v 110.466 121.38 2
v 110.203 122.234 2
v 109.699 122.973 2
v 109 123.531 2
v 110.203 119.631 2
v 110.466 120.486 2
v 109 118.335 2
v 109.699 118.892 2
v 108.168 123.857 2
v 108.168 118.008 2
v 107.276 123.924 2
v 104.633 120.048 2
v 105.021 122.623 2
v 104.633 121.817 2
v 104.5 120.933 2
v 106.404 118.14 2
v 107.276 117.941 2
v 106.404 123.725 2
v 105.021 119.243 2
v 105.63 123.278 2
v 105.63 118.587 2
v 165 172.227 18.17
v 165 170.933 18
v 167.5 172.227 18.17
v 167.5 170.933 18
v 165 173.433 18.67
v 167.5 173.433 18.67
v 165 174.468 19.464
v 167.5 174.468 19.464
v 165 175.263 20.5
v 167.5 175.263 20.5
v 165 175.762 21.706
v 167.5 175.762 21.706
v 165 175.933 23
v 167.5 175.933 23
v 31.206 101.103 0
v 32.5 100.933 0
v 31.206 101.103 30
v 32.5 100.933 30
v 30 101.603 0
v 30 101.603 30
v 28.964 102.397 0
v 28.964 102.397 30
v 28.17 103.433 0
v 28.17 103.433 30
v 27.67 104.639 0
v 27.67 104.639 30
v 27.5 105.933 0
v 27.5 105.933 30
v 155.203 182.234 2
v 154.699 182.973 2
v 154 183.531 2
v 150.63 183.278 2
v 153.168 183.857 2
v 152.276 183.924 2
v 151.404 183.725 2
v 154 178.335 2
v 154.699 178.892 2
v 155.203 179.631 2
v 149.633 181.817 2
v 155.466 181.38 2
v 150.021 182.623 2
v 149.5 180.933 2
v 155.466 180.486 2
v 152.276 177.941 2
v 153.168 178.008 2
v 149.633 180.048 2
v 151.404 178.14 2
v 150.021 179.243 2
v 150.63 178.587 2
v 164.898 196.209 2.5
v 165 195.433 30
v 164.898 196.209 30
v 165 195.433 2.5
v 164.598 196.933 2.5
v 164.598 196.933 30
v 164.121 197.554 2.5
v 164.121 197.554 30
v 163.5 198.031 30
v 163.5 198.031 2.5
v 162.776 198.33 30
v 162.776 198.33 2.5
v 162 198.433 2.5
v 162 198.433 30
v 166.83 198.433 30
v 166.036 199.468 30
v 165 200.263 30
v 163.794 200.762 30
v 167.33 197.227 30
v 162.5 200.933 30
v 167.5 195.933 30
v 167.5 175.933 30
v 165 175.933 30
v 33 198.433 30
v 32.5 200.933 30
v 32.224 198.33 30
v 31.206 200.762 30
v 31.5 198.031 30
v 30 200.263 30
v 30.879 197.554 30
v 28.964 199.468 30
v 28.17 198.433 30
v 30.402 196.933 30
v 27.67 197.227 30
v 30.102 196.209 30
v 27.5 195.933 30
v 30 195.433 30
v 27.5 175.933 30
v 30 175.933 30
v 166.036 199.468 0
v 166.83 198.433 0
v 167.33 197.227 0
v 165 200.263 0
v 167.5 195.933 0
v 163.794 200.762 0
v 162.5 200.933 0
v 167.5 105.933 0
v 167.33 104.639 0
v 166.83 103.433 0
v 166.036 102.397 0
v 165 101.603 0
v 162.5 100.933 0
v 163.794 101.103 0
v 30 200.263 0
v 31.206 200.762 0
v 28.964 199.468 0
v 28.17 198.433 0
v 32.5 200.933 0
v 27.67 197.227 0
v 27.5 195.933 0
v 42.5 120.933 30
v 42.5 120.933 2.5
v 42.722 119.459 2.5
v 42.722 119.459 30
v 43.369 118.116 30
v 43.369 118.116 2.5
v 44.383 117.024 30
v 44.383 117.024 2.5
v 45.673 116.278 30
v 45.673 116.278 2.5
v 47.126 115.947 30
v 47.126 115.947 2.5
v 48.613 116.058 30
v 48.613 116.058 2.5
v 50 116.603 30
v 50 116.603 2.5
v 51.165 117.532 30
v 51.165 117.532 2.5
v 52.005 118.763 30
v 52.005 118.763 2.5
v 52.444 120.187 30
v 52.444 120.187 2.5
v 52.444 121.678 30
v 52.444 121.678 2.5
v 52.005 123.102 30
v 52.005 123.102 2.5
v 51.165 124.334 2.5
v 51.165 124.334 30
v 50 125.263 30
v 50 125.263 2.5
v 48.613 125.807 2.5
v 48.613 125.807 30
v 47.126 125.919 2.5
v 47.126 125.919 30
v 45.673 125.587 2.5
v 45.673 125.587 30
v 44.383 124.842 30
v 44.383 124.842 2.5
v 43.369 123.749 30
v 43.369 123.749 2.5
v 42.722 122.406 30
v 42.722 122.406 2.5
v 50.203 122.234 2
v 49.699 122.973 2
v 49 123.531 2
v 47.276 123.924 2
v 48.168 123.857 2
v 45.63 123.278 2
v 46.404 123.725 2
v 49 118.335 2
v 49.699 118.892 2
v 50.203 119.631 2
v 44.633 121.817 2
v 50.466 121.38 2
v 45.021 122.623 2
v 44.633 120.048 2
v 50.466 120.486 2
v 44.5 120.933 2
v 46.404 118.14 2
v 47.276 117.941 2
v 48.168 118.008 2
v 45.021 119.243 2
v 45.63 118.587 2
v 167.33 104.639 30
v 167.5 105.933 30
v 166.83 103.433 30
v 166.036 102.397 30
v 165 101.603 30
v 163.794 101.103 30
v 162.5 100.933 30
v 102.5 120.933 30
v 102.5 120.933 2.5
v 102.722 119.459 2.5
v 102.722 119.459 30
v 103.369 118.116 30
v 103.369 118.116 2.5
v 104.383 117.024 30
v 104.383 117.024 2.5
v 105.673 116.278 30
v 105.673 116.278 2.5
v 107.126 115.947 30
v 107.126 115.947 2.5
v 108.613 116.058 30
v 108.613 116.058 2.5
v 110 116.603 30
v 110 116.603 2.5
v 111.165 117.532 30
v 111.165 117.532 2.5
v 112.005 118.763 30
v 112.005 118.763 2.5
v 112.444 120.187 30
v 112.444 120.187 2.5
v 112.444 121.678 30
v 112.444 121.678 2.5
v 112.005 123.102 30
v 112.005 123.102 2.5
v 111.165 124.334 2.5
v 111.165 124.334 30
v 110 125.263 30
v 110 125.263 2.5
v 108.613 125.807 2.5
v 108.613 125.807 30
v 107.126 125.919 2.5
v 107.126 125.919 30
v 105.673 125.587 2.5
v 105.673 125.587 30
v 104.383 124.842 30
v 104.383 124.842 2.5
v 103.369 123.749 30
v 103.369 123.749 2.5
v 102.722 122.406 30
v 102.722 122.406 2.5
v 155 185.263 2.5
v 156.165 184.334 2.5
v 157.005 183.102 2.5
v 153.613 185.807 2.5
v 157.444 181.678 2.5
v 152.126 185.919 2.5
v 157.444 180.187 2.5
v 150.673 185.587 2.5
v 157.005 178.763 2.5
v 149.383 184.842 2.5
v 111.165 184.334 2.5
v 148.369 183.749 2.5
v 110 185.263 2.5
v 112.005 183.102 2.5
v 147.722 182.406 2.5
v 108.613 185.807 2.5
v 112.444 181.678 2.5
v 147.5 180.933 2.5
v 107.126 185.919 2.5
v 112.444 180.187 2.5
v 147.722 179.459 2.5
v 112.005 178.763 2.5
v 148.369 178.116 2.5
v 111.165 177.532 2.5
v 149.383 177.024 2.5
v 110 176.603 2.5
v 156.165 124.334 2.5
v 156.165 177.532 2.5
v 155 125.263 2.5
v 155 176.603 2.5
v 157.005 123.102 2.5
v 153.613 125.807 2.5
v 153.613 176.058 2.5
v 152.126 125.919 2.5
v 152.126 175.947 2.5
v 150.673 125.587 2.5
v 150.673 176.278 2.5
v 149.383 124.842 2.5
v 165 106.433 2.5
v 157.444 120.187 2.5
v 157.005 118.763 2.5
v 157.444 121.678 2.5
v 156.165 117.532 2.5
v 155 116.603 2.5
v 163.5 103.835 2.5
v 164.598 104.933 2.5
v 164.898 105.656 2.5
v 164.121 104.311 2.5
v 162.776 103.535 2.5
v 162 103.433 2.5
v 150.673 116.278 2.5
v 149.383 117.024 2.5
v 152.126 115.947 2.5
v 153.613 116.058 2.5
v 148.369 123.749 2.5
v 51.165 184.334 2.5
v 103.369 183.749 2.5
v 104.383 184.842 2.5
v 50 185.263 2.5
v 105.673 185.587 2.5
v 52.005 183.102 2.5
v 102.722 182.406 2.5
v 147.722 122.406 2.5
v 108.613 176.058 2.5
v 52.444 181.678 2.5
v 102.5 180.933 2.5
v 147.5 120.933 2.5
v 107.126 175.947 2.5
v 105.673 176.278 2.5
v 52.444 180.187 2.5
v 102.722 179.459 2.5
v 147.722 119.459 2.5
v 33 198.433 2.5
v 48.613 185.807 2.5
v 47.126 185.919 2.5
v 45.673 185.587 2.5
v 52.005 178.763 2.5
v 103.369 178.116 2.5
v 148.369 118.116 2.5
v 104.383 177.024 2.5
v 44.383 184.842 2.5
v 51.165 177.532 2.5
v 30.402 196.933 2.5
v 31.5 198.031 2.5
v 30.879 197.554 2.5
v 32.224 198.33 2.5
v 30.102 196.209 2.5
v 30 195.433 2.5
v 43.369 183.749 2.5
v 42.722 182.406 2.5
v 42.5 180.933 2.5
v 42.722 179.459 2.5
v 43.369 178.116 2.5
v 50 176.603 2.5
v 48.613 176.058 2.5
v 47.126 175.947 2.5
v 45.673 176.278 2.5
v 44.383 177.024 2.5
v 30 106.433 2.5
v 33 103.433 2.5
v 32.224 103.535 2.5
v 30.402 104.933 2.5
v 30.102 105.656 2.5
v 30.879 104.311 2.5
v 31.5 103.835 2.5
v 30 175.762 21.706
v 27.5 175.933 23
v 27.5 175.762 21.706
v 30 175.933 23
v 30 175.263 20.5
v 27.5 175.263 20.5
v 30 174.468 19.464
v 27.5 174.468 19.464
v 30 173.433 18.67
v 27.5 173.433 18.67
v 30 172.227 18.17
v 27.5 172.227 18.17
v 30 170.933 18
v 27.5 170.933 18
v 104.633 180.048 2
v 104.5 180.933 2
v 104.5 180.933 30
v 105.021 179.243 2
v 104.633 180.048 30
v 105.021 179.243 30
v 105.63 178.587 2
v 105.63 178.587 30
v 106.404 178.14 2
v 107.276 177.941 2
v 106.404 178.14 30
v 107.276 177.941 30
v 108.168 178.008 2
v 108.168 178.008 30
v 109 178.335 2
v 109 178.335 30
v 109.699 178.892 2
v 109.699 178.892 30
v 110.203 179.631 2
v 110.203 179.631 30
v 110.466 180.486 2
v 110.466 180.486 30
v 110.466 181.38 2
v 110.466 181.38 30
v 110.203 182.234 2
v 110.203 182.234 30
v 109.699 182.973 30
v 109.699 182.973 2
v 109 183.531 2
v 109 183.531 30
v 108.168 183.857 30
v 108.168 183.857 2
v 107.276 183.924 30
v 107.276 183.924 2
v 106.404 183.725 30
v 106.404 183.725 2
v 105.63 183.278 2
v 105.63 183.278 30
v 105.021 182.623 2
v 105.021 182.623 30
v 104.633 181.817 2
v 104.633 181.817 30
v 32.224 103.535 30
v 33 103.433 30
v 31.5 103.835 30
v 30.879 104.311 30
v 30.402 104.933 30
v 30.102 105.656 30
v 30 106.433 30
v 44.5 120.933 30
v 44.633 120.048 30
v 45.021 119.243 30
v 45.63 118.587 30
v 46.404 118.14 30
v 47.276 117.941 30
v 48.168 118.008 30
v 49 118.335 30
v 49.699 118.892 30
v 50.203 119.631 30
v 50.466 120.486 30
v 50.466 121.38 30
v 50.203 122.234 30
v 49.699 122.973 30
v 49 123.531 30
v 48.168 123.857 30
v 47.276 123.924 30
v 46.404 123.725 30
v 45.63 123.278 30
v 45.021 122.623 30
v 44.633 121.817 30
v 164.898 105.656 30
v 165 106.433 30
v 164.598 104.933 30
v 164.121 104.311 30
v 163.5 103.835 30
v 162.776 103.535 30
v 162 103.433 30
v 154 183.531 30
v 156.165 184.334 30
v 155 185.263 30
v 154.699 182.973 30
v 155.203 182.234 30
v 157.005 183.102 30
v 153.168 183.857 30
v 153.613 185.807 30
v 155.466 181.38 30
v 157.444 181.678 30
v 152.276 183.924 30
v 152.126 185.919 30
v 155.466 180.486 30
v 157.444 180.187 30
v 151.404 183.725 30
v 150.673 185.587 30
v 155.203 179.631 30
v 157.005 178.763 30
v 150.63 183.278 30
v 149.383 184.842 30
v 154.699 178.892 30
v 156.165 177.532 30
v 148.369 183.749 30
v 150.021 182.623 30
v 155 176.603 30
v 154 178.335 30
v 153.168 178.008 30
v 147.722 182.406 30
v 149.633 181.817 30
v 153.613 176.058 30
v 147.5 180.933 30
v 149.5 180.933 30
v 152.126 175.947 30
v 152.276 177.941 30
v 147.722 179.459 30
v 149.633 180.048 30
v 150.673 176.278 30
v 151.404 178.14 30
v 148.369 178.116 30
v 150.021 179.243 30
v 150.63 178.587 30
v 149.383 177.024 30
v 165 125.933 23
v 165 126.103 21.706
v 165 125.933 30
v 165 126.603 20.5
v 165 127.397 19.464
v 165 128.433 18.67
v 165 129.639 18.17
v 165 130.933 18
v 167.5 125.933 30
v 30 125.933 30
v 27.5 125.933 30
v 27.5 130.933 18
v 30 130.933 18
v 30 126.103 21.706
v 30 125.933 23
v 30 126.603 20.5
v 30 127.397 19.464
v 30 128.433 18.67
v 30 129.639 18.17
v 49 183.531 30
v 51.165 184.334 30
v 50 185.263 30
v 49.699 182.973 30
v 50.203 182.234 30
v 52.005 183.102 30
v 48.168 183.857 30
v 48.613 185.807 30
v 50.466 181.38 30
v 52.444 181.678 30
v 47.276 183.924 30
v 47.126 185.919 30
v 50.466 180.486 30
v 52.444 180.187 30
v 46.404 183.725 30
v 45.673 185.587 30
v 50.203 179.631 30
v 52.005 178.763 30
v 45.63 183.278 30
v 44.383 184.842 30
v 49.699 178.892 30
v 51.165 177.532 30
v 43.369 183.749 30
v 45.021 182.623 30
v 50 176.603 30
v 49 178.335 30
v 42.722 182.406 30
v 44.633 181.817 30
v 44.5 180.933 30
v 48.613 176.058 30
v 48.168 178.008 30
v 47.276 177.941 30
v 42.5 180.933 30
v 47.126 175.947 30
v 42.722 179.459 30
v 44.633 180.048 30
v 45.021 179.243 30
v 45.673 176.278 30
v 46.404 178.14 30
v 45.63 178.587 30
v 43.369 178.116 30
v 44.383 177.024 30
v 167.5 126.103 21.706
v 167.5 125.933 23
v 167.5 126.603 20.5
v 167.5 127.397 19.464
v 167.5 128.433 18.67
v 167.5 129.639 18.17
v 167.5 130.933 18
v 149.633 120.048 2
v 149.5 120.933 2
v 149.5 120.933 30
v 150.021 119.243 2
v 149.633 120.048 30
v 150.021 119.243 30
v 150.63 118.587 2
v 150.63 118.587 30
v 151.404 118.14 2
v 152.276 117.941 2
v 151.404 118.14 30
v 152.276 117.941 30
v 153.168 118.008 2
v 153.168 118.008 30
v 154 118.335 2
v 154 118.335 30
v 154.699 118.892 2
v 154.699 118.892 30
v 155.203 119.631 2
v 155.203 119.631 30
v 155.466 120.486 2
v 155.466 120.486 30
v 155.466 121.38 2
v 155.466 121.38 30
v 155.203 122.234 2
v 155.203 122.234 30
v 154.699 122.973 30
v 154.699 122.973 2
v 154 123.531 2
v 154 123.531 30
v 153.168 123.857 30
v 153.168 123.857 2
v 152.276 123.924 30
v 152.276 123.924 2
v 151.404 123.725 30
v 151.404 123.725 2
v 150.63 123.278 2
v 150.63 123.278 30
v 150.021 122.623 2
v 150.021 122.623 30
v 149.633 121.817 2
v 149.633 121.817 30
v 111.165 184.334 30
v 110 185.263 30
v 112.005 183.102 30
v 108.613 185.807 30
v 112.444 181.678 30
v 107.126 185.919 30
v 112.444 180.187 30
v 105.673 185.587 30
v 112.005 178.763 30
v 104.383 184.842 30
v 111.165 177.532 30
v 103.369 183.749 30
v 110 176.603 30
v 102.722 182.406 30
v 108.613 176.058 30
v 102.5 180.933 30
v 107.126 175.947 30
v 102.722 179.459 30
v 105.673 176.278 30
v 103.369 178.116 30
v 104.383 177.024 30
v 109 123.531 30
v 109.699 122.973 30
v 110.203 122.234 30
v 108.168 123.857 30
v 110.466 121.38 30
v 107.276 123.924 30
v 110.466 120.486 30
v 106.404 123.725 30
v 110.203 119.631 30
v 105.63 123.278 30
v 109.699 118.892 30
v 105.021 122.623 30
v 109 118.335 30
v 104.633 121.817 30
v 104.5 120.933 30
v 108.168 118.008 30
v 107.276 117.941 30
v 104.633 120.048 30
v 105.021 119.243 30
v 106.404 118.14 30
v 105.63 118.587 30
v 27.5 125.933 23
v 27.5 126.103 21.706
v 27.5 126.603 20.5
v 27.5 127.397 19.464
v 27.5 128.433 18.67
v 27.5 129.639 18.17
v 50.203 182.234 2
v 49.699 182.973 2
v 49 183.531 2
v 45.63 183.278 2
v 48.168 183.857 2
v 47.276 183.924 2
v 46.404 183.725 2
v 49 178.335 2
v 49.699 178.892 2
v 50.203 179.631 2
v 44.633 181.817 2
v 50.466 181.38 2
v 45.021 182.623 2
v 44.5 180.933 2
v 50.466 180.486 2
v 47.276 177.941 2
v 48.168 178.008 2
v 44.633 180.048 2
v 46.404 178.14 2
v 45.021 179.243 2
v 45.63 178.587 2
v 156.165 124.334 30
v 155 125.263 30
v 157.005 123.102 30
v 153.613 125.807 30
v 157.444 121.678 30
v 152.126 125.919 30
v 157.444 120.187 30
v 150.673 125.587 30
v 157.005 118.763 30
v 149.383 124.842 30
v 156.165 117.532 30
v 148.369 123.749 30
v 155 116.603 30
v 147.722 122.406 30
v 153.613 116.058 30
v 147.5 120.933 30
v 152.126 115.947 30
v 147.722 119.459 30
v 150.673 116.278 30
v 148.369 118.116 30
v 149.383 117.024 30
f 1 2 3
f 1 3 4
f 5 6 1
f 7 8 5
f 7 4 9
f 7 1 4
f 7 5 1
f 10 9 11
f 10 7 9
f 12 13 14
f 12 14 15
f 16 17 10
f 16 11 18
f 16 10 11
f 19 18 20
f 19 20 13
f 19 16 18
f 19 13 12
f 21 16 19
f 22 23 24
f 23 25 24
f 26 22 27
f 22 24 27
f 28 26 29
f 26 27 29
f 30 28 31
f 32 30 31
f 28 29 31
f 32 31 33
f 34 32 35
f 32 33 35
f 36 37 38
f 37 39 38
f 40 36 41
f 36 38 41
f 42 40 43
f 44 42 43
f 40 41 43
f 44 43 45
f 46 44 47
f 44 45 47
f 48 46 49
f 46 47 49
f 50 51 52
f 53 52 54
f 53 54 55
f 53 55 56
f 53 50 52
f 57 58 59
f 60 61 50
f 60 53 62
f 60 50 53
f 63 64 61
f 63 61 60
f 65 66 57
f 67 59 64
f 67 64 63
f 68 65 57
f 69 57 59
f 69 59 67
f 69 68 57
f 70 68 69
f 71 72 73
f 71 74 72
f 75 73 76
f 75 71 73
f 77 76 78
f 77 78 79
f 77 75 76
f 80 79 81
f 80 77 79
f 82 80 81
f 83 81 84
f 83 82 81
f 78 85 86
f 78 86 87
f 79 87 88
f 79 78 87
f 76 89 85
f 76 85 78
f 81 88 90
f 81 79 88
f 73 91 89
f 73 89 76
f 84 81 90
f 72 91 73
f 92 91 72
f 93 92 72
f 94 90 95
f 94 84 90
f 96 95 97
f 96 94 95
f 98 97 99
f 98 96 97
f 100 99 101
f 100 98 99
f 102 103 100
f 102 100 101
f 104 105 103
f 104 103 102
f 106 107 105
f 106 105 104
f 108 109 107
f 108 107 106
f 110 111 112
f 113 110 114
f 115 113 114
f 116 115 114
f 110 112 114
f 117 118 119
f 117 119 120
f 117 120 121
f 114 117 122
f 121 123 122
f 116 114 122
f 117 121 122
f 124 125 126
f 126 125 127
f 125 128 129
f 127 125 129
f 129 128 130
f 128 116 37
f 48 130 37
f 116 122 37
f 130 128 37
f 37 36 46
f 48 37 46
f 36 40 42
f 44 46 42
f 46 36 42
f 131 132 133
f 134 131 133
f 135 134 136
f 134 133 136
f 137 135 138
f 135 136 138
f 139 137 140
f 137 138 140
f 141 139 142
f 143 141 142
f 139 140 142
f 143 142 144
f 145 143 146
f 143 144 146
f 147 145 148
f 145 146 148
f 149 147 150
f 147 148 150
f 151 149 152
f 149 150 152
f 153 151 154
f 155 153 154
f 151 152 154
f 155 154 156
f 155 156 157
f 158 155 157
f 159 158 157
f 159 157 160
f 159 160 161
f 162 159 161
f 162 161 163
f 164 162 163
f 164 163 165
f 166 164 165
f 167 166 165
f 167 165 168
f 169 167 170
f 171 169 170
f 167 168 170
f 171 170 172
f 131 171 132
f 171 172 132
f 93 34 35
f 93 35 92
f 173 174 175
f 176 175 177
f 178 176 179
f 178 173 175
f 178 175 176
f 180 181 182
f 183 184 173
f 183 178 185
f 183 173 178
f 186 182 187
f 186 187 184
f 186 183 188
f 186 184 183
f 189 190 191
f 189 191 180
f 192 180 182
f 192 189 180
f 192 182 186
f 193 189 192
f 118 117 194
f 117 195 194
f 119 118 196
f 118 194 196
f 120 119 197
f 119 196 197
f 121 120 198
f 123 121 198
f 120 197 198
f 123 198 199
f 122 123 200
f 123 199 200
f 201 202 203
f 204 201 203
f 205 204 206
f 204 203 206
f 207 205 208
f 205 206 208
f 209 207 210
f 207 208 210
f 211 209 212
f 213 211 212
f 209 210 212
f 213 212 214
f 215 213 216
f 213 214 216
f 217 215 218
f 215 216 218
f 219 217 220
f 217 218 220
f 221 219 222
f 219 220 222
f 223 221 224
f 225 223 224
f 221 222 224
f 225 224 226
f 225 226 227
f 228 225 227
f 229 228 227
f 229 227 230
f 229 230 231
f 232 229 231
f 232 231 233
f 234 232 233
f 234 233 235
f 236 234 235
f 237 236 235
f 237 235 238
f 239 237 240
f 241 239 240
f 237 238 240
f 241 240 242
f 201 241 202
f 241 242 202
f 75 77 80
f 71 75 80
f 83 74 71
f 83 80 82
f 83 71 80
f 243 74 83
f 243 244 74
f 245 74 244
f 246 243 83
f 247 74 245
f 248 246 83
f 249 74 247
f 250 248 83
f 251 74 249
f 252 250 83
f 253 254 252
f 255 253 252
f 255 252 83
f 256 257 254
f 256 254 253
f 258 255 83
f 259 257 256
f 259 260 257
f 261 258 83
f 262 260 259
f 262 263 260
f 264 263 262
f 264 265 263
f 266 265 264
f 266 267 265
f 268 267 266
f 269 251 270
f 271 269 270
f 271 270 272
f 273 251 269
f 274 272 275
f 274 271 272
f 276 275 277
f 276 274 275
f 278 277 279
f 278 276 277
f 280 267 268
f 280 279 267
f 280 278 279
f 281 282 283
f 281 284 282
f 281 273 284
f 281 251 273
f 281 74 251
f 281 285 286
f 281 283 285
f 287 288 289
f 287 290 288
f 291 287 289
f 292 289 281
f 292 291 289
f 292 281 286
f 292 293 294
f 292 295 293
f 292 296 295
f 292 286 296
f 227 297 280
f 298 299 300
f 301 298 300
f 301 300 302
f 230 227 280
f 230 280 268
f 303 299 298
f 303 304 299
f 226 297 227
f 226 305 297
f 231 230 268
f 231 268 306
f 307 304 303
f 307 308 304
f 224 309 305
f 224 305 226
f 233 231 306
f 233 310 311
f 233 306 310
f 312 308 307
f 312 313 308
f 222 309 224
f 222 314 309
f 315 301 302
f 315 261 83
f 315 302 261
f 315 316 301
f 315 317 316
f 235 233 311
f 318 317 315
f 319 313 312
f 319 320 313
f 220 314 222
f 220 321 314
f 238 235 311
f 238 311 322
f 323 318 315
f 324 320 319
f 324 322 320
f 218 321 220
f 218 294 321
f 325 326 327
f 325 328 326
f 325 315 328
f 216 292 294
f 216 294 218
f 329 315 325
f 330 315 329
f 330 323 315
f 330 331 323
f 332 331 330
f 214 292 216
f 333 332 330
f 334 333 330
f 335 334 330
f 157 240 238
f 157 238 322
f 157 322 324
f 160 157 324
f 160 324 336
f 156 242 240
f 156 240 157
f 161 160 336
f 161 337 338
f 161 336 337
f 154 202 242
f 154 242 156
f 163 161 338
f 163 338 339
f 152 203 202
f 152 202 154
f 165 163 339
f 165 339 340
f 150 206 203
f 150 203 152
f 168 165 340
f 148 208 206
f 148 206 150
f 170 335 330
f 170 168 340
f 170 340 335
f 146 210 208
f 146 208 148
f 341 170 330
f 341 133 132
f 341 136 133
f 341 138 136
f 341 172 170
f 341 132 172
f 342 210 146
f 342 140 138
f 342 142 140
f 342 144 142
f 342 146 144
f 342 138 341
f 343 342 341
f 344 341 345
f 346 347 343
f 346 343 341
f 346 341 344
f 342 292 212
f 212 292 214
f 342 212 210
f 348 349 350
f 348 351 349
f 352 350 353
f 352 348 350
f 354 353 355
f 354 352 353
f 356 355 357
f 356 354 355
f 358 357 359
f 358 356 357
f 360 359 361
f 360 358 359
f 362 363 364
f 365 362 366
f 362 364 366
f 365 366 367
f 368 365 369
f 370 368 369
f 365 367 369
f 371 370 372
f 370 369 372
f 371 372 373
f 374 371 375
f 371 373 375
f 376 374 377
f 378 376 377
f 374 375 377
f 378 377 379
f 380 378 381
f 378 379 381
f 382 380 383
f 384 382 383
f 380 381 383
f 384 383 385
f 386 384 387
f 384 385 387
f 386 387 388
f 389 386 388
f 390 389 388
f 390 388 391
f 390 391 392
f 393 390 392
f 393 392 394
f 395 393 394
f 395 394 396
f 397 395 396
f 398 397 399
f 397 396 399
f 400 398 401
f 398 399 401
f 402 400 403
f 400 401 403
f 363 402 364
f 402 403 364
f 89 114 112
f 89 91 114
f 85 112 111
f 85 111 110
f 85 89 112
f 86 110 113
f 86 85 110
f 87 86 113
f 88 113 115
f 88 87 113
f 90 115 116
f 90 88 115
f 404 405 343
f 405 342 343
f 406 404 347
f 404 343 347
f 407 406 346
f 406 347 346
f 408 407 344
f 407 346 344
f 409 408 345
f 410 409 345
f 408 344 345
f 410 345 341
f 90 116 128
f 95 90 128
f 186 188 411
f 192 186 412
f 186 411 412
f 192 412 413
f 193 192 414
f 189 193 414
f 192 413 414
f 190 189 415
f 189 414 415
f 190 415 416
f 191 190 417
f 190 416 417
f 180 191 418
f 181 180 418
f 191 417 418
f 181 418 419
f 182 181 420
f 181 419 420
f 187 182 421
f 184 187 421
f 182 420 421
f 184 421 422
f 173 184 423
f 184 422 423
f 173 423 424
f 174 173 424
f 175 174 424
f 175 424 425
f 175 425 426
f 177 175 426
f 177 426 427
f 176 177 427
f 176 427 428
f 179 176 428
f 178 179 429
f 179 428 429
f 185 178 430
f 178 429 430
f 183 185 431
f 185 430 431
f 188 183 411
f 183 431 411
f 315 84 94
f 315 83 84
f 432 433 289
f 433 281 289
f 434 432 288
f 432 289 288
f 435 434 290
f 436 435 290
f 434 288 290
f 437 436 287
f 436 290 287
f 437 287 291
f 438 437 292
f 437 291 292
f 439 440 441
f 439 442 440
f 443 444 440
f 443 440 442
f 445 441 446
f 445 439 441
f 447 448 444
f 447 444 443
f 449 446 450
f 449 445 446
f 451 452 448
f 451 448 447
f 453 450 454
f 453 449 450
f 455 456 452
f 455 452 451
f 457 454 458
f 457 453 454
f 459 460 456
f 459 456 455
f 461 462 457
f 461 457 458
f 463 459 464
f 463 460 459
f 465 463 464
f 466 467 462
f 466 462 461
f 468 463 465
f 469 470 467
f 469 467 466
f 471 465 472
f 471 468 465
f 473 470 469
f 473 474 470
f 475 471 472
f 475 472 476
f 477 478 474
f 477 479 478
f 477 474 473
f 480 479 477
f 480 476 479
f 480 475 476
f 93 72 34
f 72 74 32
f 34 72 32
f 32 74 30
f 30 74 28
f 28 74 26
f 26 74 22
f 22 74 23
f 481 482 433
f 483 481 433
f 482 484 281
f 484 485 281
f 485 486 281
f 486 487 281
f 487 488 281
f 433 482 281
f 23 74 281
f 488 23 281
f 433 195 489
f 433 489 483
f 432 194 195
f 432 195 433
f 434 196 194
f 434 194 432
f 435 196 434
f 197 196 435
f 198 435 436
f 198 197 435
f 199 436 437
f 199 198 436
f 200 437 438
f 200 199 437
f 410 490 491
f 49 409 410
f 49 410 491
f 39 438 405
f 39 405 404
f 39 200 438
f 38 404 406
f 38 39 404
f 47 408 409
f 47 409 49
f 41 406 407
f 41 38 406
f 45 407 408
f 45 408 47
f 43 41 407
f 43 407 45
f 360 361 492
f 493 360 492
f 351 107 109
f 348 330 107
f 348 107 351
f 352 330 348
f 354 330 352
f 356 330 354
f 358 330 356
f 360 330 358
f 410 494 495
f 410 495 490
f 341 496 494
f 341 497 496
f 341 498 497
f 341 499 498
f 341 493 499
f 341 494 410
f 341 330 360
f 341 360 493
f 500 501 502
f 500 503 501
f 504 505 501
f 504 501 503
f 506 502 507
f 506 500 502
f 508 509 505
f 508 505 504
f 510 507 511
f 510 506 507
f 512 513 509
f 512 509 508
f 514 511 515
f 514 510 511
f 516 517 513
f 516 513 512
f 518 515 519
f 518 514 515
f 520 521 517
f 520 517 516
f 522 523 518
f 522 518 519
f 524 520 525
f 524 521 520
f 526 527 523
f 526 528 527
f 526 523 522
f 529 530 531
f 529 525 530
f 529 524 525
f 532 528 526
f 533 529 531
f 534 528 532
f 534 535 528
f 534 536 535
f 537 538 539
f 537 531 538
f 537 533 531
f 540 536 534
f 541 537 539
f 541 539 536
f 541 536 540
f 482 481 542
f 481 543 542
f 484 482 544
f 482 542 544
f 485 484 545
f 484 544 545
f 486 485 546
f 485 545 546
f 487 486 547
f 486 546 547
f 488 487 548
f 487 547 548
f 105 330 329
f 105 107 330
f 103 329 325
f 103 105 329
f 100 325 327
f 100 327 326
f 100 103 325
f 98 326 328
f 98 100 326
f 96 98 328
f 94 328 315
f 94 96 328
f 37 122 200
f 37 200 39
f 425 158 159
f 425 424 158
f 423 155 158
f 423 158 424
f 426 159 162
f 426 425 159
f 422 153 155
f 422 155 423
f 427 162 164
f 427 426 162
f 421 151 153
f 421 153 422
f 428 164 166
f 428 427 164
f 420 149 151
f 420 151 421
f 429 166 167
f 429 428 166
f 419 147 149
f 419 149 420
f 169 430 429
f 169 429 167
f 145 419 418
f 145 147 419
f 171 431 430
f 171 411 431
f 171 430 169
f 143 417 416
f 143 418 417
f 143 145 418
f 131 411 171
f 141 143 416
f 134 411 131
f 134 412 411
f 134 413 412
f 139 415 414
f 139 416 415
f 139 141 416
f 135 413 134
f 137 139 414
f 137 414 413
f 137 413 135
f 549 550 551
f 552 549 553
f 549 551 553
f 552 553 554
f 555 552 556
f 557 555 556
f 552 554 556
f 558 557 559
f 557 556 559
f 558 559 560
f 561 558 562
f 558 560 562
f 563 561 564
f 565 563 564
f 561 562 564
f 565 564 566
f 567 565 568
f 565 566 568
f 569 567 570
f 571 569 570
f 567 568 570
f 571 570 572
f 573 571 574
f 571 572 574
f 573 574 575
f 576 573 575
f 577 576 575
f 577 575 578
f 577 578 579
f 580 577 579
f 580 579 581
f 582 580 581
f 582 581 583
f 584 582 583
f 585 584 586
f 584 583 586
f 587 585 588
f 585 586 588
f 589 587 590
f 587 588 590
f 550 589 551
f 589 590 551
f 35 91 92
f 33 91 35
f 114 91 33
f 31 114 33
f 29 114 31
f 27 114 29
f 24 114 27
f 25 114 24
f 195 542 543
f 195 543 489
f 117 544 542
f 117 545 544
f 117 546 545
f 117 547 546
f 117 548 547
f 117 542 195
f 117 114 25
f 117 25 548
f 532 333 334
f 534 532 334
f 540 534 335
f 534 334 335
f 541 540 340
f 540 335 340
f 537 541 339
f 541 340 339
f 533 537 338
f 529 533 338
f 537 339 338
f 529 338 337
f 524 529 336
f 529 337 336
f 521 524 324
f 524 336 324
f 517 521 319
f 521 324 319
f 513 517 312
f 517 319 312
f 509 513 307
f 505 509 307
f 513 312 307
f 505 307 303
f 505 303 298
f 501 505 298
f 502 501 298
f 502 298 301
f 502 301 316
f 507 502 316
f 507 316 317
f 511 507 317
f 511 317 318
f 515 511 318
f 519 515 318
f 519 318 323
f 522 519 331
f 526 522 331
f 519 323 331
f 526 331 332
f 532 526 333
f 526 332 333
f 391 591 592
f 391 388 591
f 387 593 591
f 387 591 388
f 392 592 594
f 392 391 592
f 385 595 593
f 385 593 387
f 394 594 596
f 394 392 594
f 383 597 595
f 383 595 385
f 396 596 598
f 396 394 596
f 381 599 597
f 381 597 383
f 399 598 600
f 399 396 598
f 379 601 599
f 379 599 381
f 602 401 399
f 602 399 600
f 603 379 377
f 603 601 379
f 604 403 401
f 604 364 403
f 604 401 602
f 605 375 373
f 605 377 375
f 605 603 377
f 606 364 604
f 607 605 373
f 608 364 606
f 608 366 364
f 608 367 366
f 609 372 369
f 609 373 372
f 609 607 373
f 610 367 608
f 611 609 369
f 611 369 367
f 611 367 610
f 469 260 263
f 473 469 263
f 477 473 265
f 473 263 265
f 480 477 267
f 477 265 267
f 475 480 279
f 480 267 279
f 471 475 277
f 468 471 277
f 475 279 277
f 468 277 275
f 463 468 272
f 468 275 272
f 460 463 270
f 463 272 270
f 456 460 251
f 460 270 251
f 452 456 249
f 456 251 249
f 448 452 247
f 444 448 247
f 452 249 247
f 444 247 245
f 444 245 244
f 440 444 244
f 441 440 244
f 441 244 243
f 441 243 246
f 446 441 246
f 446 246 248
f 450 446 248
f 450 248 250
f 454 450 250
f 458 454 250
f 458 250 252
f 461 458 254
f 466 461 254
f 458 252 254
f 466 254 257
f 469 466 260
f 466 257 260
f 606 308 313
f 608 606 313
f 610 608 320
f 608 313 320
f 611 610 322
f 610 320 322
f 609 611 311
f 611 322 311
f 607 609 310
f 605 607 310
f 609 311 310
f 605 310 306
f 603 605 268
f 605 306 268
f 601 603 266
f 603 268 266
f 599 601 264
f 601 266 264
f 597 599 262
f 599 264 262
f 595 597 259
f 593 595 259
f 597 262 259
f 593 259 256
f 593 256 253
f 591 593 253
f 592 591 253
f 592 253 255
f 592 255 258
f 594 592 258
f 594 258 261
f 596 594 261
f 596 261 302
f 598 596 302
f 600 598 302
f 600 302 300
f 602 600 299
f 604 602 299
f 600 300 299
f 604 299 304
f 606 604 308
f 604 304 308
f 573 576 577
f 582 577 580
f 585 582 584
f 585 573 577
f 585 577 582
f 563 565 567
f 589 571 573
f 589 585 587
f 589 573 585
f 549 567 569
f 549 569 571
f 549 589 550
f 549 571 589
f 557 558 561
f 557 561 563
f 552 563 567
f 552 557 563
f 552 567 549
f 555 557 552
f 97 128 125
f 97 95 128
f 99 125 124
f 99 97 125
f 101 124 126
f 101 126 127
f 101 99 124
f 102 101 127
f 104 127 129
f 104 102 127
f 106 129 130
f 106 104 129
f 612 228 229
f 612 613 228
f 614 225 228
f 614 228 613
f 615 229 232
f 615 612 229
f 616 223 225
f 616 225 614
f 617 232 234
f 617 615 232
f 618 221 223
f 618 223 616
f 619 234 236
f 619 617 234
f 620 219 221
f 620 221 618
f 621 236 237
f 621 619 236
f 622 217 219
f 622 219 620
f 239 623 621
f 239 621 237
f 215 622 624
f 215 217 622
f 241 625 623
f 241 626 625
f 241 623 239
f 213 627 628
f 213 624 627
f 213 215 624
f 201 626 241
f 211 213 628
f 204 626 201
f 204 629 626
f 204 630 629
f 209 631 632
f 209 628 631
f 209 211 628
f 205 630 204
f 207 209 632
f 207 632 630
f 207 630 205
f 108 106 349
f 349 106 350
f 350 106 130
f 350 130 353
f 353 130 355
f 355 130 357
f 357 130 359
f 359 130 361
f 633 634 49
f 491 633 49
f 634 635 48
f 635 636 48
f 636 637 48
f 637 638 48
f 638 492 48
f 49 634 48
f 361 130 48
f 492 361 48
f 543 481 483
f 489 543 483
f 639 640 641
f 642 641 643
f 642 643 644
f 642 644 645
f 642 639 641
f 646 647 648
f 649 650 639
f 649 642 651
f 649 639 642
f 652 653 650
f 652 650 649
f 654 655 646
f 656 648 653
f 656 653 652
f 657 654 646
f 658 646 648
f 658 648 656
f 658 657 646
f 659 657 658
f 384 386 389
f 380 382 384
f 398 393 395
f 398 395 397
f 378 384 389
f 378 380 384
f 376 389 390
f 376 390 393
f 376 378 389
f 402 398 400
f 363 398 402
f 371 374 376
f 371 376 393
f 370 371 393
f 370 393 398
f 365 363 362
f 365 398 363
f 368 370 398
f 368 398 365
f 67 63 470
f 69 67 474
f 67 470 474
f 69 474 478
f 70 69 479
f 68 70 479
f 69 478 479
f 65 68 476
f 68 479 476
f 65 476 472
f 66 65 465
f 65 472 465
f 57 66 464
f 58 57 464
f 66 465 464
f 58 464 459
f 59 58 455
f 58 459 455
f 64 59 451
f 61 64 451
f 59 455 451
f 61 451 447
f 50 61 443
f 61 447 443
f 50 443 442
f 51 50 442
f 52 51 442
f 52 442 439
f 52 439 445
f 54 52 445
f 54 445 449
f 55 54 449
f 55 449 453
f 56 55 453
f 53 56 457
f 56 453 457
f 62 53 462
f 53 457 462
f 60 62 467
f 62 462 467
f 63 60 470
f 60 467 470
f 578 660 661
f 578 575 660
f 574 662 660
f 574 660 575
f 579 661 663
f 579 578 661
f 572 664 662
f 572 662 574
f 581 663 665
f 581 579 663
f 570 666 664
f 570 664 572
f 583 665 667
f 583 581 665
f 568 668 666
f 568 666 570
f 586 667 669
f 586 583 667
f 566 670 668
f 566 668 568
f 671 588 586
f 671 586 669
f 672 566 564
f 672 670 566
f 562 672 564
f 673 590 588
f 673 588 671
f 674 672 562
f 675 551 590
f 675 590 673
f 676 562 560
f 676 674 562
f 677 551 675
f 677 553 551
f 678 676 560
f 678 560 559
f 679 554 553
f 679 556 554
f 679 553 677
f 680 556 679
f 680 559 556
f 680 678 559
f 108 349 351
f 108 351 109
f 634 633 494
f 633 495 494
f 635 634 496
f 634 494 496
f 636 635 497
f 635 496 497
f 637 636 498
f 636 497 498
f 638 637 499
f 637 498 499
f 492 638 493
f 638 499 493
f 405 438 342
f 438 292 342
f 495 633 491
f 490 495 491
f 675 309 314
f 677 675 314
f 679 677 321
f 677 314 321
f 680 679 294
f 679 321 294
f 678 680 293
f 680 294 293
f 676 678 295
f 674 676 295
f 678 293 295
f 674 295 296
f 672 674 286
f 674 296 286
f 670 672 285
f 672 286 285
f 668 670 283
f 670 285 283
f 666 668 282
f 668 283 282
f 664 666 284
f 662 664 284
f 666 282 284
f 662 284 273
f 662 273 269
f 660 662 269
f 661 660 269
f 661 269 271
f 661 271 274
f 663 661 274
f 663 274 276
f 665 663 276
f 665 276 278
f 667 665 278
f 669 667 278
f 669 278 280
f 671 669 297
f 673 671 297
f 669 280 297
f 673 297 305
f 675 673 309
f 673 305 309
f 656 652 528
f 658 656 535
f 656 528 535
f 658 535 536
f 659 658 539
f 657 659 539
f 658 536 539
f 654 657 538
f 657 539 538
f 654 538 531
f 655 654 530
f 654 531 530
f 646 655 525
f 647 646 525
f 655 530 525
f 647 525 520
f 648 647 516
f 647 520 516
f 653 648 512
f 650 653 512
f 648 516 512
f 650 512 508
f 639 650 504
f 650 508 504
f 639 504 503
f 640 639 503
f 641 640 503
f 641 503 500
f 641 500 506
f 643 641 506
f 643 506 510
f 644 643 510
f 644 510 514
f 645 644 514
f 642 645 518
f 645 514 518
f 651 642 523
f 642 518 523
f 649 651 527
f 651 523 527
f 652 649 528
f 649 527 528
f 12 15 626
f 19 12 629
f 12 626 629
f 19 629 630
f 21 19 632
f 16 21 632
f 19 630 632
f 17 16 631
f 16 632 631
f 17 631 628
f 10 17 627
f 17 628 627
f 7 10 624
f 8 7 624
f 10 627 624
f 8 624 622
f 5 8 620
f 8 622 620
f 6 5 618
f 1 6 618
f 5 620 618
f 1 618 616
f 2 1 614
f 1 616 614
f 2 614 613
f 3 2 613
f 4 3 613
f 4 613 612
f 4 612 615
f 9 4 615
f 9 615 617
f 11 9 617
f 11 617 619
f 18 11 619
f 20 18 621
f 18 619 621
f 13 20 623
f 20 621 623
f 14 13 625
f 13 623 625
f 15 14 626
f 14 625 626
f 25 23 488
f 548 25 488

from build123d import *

# Parameters (mm, degrees)
F0_W          = 140
F0_H          = 100
F1_DEPTH      = 30
F2_T          = -2.5
F3_W          = 50
F3_H          = 12
F4_DEPTH      = 205.5
F5_R          = 5
F6_R          = 5
F7_R          = 3
F8_R          = 5
F9_DEPTH      = 27.5
F10_T         = 2
F10_T3_DEPTH  = 93
F10_T5_DEPTH  = 133
F10_T8_ANGLE  = 90.000000001
F10_T10_ANGLE = 90.000000001
F10_T12_ANGLE = 90.000000001
F10_T14_ANGLE = 90.000000001
F11_ANGLE     = 60
F12_ANGLE     = 30
F13_ANGLE     = 90


# Not quite as in the source:
# - a shell that OpenCascade refuses in one call is made with other operations: the cavity is built on its own and cut out


with BuildPart() as f1:
    # F0 (on Top) → F1 (new body)
    with BuildSketch(Plane.XY):
        with Locations((50, 0)):
            Rectangle(F0_W, F0_H)
    extrude(amount=F1_DEPTH)

    # F2
    f2_openings = [f1.faces().sort_by_distance(p)[0] for p in [
        (50, 0, 30),
    ]]
    offset(amount=F2_T, openings=f2_openings)

    # F3 (on face) → F4 (cut)
    with BuildSketch(Plane.YZ.offset(120)):
        with Locations((0, 24)):
            Rectangle(F3_W, F3_H)
    extrude(amount=-F4_DEPTH, mode=Mode.SUBTRACT)

    # F5
    f5_edges = [f1.edges().sort_by_distance(p)[0] for p in [
        (-18.75, 25, 18),
        (-18.75, -25, 18),
        (118.75, -25, 18),
        (118.75, 25, 18),
    ]]
    fillet(f5_edges, radius=F5_R)

    # F6
    f6_edges = [f1.edges().sort_by_distance(p)[0] for p in [
        (120, 50, 15),
        (-20, 50, 15),
        (-20, -50, 15),
        (120, -50, 15),
    ]]
    fillet(f6_edges, radius=F6_R)

    # F7
    f7_edges = [f1.edges().sort_by_distance(p)[0] for p in [
        (-17.5, -47.5, 16.25),
        (-17.5, 47.5, 16.25),
        (117.5, 47.5, 16.25),
        (117.5, -47.5, 16.25),
    ]]
    fillet(f7_edges, radius=F7_R)

    # F8 (on face) → F9 (join, through all)
    with BuildSketch(Plane.XY.offset(2.5)):
        with Locations((-5, -30)):
            Circle(F8_R)
        with Locations((40, -30)):
            Circle(F8_R)
        with Locations((100, -30)):
            Circle(F8_R)
        with Locations((100, 30)):
            Circle(F8_R)
        with Locations((40, 30)):
            Circle(F8_R)
        with Locations((-5, 30)):
            Circle(F8_R)
    extrude(amount=F9_DEPTH)

    # F10: shell of thickness 2, made by hand


with BuildPart() as f10_core1:
    # F10_t2: copy of F1
    add(f1.part)

    # the walls: a layer under each face that stays
    f10_faces = [f10_core1.faces().sort_by_distance(p)[0] for p in [
        (-10, -48.2142857143, 30),
        (117.5, 0, 16.25),
        (116.6213203436, -46.6213203436, 16.25),
        (118.75, -25, 26.5),
        (50, -47.5, 16.25),
        (120, 0, 15),
        (-16.6213203436, -46.6213203436, 16.25),
        (118.5355339059, -48.5355339059, 15),
        (-17.5, 0, 16.25),
        (50, -50, 15),
        (-18.75, -25, 26.5),
        (-18.5355339059, -48.5355339059, 15),
        (-20, 0, 15),
        (-10, 48.2142857143, 30),
        (116.6213203436, 46.6213203436, 16.25),
        (118.75, 25, 26.5),
        (50, 0, 2.5),
        (118.75, 23.5355339059, 19.4644660941),
        (118.75, 0, 18),
        (118.75, -23.5355339059, 19.4644660941),
        (118.5355339059, 48.5355339059, 15),
        (50, 0, 0),
        (-18.75, -23.5355339059, 19.4644660941),
        (-16.6213203436, 46.6213203436, 16.25),
        (-18.75, 0, 18),
        (-18.75, 23.5355339059, 19.4644660941),
        (-18.75, 25, 26.5),
        (-18.5355339059, 48.5355339059, 15),
        (50, 47.5, 16.25),
        (50, 50, 15),
        (-10, -30, 16.25),
        (35, -30, 16.25),
        (95, -30, 16.25),
        (-10, 30, 16.25),
        (35, 30, 16.25),
        (95, 30, 16.25),
    ]]
    thicken(f10_faces, amount=-F10_T, mode=Mode.SUBTRACT)

    # F10_s4 → F10_t3 (cut)
    with BuildSketch(Plane.XZ.offset(-46.5)):
        Polygon((117.48, 2.52), (119.5, 2.5), (119.5, 0.5), (117.5, 0.5), align=None)
        Polygon((-17.48, 2.52), (-19.5, 2.5), (-19.5, 0.5), (-17.5, 0.5), align=None)
    extrude(amount=F10_T3_DEPTH, mode=Mode.SUBTRACT)

    # F10_s6 → F10_t5 (cut)
    with BuildSketch(Plane.YZ.offset(-16.5)):
        Polygon((-47.48, 2.52), (-49.5, 2.5), (-49.5, 0.5), (-47.5, 0.5), align=None)
        Polygon((47.48, 2.52), (47.5, 0.5), (49.5, 0.5), (49.5, 2.5), align=None)
    extrude(amount=F10_T5_DEPTH, mode=Mode.SUBTRACT)

    # F10_s7 → F10_t8 (revolve, cut)
    with BuildSketch(Plane.XZ.offset(44.5)):
        Polygon((117.48, 2.52), (119.5, 2.5), (119.5, 0.5), (117.5, 0.5), align=None)
    revolve(axis=Axis((114.5, -44.5, 2.5), (0, 0, -1)), revolution_arc=F10_T8_ANGLE, mode=Mode.SUBTRACT)

    # F10_s9 → F10_t10 (revolve, cut)
    with BuildSketch(Plane.YZ.offset(-14.5)):
        Polygon((-47.48, 2.52), (-49.5, 2.5), (-49.5, 0.5), (-47.5, 0.5), align=None)
    revolve(axis=Axis((-14.5, -44.5, 2.5), (0, 0, -1)), revolution_arc=F10_T10_ANGLE, mode=Mode.SUBTRACT)

    # F10_s11 → F10_t12 (revolve, cut)
    with BuildSketch(Plane.XZ.offset(-44.5)):
        Polygon((117.48, 2.52), (119.5, 2.5), (119.5, 0.5), (117.5, 0.5), align=None)
    revolve(axis=Axis((114.5, 44.5, 2.5), (0, 0, 1)), revolution_arc=F10_T12_ANGLE, mode=Mode.SUBTRACT)

    # F10_s13 → F10_t14 (revolve, cut)
    with BuildSketch(Plane.XZ.offset(-44.5)):
        Polygon((-17.48, 2.52), (-17.5, 0.5), (-19.5, 0.5), (-19.5, 2.5), align=None)
    revolve(axis=Axis((-14.5, 44.5, 2.5), (0, 0, -1)), revolution_arc=F10_T14_ANGLE, mode=Mode.SUBTRACT)

    # F10_s15 → F10_t16 (revolve, cut)
    with BuildSketch(Plane.XZ.offset(30)):
        Polygon((0.02, 2.52), (0, 0.5), (-2, 0.5), (-2, 2.5), align=None)
    revolve(axis=Axis((-5, -30, 2.5), (0, 0, 1)), mode=Mode.SUBTRACT)

    # F10_s17 → F10_t18 (revolve, cut)
    with BuildSketch(Plane.XZ.offset(30)):
        Polygon((45.02, 2.52), (45, 0.5), (43, 0.5), (43, 2.5), align=None)
    revolve(axis=Axis((40, -30, 2.5), (0, 0, 1)), mode=Mode.SUBTRACT)

    # F10_s19 → F10_t20 (revolve, cut)
    with BuildSketch(Plane.XZ.offset(30)):
        Polygon((105.02, 2.52), (105, 0.5), (103, 0.5), (103, 2.5), align=None)
    revolve(axis=Axis((100, -30, 2.5), (0, 0, 1)), mode=Mode.SUBTRACT)

    # F10_s21 → F10_t22 (revolve, cut)
    with BuildSketch(Plane.XZ.offset(-30)):
        Polygon((0.02, 2.52), (0, 0.5), (-2, 0.5), (-2, 2.5), align=None)
    revolve(axis=Axis((-5, 30, 2.5), (0, 0, 1)), mode=Mode.SUBTRACT)

    # F10_s23 → F10_t24 (revolve, cut)
    with BuildSketch(Plane.XZ.offset(-30)):
        Polygon((45.02, 2.52), (45, 0.5), (43, 0.5), (43, 2.5), align=None)
    revolve(axis=Axis((40, 30, 2.5), (0, 0, 1)), mode=Mode.SUBTRACT)

    # F10_s25 → F10_t26 (revolve, cut)
    with BuildSketch(Plane.XZ.offset(-30)):
        Polygon((105.02, 2.52), (105, 0.5), (103, 0.5), (103, 2.5), align=None)
    revolve(axis=Axis((100, 30, 2.5), (0, 0, 1)), mode=Mode.SUBTRACT)


with BuildPart() as f1_1:
    add(f1.part)

    # what is left inside the walls is the cavity
    f10_cavity = [f10_core1.part.solids().sort_by_distance(p)[0] for p in [
        (-7.98, -30, 11.333333),
        (37.02, -30, 11.333333),
        (97.02, -30, 11.333333),
        (-7.98, 30, 11.333333),
        (37.02, 30, 11.333333),
        (97.02, 30, 11.333333),
    ]]
    add(f10_cavity, mode=Mode.SUBTRACT)


with BuildPart() as f1_2:
    # F11: moved
    add(f1_1.part.rotate(Axis((-5, 30, 2), (0, 0, 1)), F11_ANGLE))


with BuildPart() as f1_3:
    # F12: moved
    add(f1_2.part.rotate(Axis((47.5, 120.9326673974, 0.5), (0, 0, 1)), F12_ANGLE))


with BuildPart() as f1_4:
    # F13: moved
    add(f1_3.part.rotate(Axis((47.5, 120.9326673974, 0.5), (0, 0, 1)), F13_ANGLE))


solid = f1_4.part
